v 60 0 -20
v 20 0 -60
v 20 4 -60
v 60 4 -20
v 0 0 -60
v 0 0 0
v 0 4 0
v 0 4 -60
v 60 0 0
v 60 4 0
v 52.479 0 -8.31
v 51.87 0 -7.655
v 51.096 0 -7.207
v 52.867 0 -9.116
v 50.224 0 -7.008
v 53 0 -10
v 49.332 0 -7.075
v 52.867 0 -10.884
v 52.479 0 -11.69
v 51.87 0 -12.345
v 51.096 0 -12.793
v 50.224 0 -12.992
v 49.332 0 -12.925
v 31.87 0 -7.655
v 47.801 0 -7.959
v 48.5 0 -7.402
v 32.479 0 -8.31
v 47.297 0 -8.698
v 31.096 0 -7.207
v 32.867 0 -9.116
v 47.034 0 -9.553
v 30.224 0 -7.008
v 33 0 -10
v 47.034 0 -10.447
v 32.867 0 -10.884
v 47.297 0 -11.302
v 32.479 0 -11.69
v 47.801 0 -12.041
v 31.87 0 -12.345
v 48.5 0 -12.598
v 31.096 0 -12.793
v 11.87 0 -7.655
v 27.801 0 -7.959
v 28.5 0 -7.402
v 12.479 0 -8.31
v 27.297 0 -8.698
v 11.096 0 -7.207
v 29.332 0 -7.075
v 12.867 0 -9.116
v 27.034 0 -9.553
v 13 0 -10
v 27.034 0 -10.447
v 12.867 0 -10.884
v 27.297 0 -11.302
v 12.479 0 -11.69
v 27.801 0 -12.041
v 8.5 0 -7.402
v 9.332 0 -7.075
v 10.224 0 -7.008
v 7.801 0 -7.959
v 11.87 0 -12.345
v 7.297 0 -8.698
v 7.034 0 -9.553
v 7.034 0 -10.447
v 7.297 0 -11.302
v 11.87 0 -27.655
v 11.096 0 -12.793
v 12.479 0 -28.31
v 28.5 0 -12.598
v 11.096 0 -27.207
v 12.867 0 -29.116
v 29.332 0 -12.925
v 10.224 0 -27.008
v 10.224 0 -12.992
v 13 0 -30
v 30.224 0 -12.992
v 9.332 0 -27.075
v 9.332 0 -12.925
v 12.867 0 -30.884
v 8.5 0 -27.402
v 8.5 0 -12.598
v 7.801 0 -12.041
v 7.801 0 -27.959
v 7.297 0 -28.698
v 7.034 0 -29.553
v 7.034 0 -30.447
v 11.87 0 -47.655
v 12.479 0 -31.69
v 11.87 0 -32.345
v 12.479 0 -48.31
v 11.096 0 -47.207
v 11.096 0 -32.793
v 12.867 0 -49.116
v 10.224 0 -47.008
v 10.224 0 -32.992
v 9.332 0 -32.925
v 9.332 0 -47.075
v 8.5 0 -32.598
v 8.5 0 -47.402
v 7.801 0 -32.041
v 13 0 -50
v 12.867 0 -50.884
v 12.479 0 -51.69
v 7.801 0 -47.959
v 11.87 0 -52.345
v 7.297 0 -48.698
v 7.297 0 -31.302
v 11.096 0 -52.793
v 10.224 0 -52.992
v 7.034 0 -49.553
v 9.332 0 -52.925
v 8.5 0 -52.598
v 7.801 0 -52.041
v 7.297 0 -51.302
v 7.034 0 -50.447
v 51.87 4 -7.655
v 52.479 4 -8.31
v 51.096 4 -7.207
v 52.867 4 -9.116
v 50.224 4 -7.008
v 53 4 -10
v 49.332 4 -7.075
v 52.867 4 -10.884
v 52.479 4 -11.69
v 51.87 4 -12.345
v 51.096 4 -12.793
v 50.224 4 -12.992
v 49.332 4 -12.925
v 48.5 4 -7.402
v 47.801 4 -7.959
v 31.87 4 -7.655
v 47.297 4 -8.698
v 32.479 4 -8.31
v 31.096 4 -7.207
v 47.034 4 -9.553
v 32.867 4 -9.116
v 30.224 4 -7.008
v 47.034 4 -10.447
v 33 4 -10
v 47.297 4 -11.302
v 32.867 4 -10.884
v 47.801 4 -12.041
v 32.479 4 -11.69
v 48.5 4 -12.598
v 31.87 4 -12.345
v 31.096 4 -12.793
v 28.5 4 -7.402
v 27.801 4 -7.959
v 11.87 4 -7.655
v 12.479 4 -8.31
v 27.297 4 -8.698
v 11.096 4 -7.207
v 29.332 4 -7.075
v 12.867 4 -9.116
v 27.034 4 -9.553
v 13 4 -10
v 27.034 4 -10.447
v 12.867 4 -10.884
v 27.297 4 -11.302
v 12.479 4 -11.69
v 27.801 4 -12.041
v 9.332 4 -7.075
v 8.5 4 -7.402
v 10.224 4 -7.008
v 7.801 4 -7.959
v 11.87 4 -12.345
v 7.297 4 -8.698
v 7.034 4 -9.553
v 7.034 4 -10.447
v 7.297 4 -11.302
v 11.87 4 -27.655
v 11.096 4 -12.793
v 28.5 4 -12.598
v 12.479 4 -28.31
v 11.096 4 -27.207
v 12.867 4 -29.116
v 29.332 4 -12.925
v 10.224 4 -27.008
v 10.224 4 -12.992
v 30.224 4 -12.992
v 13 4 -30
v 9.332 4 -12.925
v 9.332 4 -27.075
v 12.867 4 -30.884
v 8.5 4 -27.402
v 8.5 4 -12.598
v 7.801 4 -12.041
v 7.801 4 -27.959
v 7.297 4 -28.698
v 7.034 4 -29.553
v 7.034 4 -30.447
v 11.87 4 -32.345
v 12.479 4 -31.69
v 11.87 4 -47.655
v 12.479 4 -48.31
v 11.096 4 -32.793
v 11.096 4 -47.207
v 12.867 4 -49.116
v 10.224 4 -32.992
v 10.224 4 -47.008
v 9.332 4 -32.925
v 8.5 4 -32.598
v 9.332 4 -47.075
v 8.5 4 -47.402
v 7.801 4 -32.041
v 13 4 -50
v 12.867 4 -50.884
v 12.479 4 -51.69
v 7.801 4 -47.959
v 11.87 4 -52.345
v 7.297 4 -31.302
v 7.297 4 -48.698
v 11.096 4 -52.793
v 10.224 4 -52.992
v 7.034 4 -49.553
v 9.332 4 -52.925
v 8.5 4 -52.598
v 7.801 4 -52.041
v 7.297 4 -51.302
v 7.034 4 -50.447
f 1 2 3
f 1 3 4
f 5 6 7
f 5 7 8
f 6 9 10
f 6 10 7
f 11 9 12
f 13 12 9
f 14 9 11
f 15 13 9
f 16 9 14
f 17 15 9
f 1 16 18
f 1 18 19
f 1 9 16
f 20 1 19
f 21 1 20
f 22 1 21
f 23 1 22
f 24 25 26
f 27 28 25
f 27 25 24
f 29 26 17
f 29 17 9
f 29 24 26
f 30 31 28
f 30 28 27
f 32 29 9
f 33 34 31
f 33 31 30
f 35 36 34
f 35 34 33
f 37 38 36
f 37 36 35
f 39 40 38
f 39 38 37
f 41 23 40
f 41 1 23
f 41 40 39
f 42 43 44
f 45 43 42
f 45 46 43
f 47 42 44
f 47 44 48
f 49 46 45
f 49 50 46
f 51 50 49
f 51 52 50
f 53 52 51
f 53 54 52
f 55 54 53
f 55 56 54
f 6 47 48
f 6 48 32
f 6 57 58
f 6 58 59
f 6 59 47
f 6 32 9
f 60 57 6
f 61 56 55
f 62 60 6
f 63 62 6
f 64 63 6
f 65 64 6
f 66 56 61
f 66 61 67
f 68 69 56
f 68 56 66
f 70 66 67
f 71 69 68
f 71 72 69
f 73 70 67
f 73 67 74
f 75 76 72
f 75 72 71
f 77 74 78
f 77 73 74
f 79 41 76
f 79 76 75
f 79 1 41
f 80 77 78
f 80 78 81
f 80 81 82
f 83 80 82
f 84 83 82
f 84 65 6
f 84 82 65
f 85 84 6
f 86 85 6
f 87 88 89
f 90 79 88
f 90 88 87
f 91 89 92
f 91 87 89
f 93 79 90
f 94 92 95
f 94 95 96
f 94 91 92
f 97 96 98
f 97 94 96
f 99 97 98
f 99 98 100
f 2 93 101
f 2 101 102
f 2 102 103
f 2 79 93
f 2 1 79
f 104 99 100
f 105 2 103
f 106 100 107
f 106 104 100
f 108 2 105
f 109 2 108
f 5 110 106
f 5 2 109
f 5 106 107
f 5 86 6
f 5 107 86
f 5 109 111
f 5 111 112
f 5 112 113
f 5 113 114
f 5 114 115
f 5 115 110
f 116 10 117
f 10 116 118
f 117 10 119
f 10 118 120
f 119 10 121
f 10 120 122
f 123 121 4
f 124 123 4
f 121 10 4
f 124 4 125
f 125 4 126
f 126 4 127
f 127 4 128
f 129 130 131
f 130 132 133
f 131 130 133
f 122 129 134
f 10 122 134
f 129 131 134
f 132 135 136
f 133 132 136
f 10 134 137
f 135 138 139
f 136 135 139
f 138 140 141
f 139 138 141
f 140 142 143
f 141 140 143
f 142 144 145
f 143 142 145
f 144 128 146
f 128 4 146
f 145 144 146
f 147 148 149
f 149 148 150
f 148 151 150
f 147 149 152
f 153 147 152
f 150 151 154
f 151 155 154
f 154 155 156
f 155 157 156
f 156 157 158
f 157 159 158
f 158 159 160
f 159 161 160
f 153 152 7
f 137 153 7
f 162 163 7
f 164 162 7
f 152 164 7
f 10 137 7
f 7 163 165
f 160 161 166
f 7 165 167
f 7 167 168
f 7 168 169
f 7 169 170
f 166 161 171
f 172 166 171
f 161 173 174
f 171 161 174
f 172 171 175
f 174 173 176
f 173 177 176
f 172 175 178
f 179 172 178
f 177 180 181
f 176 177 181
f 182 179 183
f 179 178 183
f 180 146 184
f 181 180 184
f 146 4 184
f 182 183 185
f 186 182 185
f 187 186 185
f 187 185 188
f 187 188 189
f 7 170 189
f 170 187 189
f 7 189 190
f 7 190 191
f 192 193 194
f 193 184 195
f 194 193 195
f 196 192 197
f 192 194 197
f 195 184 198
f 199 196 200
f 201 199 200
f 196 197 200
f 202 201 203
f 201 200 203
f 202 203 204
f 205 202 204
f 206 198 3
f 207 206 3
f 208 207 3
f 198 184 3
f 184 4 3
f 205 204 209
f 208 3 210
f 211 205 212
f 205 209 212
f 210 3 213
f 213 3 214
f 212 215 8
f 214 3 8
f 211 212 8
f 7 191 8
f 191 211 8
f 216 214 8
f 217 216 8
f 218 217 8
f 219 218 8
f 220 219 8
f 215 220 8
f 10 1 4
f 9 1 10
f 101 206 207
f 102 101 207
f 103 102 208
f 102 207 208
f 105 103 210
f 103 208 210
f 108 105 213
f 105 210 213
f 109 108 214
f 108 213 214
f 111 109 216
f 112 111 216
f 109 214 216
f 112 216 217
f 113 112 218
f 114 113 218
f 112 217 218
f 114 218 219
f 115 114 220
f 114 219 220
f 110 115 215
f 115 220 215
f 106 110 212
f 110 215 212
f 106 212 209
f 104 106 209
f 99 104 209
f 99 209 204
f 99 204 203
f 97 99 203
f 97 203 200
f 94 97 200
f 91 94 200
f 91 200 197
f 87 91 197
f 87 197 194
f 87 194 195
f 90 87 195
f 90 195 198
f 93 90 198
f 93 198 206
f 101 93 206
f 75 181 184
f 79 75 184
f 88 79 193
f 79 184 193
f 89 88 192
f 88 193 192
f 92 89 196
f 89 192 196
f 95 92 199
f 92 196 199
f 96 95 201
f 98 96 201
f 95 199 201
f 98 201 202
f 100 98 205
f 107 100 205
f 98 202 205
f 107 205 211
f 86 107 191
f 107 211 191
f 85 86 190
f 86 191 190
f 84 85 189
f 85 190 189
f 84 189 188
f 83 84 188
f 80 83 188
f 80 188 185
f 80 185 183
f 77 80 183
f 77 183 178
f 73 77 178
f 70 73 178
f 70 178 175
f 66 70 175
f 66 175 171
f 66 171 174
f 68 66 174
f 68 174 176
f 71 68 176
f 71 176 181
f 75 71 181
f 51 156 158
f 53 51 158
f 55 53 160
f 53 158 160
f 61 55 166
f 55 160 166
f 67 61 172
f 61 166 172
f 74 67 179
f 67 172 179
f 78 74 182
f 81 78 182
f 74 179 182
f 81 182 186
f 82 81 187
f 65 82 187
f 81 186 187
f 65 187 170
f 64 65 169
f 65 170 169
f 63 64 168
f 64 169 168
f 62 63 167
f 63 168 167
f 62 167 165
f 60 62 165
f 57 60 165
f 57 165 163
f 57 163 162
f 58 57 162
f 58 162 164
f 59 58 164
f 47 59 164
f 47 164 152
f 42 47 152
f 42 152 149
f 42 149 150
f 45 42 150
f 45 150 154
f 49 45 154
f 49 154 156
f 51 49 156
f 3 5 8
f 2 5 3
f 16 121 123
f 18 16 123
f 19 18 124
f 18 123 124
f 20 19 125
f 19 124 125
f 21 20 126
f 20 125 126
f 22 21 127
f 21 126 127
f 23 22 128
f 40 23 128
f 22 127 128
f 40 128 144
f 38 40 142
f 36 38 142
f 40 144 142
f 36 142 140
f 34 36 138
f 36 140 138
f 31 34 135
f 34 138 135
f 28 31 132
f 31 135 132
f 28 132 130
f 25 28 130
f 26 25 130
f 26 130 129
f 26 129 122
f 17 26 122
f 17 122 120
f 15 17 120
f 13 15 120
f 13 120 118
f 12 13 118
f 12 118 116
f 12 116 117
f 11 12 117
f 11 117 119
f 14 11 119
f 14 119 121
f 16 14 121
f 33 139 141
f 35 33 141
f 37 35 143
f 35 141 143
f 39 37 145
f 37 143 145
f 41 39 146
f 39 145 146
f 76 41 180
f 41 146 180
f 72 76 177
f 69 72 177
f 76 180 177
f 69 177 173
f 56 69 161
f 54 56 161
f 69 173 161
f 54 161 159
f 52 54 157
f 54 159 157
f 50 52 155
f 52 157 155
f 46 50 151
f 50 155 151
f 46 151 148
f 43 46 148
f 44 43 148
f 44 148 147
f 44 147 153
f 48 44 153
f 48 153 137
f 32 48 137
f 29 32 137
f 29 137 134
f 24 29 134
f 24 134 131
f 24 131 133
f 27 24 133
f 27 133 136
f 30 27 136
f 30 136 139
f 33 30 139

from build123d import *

# Parameters (mm, degrees)
BOSS_EXTRUDE1_DEPTH = 4
SKETCH3_R           = 3
CUT_EXTRUDE1_DEPTH  = 5


with BuildPart() as part:
    # Sketch2 → Boss-Extrude1 (new body)
    with BuildSketch(Plane(origin=(0, 0, 0), x_dir=(1, 0, 0), z_dir=(0, 1, 0))):
        Polygon((0, 0), (0, 60), (20, 60), (60, 20), (60, 0), align=None)
    extrude(amount=BOSS_EXTRUDE1_DEPTH)

    # Sketch3 → Cut-Extrude1 (cut, through all)
    with BuildSketch(Plane(origin=(0, 4, 0), x_dir=(1, 0, 0), z_dir=(0, 1, 0))):
        with Locations((10, 10)):
            Circle(SKETCH3_R)
        with Locations((30, 10)):
            Circle(SKETCH3_R)
        with Locations((50, 10)):
            Circle(SKETCH3_R)
        with Locations((10, 50)):
            Circle(SKETCH3_R)
        with Locations((10, 30)):
            Circle(SKETCH3_R)
    extrude(amount=-CUT_EXTRUDE1_DEPTH, mode=Mode.SUBTRACT)


solid = part.part
